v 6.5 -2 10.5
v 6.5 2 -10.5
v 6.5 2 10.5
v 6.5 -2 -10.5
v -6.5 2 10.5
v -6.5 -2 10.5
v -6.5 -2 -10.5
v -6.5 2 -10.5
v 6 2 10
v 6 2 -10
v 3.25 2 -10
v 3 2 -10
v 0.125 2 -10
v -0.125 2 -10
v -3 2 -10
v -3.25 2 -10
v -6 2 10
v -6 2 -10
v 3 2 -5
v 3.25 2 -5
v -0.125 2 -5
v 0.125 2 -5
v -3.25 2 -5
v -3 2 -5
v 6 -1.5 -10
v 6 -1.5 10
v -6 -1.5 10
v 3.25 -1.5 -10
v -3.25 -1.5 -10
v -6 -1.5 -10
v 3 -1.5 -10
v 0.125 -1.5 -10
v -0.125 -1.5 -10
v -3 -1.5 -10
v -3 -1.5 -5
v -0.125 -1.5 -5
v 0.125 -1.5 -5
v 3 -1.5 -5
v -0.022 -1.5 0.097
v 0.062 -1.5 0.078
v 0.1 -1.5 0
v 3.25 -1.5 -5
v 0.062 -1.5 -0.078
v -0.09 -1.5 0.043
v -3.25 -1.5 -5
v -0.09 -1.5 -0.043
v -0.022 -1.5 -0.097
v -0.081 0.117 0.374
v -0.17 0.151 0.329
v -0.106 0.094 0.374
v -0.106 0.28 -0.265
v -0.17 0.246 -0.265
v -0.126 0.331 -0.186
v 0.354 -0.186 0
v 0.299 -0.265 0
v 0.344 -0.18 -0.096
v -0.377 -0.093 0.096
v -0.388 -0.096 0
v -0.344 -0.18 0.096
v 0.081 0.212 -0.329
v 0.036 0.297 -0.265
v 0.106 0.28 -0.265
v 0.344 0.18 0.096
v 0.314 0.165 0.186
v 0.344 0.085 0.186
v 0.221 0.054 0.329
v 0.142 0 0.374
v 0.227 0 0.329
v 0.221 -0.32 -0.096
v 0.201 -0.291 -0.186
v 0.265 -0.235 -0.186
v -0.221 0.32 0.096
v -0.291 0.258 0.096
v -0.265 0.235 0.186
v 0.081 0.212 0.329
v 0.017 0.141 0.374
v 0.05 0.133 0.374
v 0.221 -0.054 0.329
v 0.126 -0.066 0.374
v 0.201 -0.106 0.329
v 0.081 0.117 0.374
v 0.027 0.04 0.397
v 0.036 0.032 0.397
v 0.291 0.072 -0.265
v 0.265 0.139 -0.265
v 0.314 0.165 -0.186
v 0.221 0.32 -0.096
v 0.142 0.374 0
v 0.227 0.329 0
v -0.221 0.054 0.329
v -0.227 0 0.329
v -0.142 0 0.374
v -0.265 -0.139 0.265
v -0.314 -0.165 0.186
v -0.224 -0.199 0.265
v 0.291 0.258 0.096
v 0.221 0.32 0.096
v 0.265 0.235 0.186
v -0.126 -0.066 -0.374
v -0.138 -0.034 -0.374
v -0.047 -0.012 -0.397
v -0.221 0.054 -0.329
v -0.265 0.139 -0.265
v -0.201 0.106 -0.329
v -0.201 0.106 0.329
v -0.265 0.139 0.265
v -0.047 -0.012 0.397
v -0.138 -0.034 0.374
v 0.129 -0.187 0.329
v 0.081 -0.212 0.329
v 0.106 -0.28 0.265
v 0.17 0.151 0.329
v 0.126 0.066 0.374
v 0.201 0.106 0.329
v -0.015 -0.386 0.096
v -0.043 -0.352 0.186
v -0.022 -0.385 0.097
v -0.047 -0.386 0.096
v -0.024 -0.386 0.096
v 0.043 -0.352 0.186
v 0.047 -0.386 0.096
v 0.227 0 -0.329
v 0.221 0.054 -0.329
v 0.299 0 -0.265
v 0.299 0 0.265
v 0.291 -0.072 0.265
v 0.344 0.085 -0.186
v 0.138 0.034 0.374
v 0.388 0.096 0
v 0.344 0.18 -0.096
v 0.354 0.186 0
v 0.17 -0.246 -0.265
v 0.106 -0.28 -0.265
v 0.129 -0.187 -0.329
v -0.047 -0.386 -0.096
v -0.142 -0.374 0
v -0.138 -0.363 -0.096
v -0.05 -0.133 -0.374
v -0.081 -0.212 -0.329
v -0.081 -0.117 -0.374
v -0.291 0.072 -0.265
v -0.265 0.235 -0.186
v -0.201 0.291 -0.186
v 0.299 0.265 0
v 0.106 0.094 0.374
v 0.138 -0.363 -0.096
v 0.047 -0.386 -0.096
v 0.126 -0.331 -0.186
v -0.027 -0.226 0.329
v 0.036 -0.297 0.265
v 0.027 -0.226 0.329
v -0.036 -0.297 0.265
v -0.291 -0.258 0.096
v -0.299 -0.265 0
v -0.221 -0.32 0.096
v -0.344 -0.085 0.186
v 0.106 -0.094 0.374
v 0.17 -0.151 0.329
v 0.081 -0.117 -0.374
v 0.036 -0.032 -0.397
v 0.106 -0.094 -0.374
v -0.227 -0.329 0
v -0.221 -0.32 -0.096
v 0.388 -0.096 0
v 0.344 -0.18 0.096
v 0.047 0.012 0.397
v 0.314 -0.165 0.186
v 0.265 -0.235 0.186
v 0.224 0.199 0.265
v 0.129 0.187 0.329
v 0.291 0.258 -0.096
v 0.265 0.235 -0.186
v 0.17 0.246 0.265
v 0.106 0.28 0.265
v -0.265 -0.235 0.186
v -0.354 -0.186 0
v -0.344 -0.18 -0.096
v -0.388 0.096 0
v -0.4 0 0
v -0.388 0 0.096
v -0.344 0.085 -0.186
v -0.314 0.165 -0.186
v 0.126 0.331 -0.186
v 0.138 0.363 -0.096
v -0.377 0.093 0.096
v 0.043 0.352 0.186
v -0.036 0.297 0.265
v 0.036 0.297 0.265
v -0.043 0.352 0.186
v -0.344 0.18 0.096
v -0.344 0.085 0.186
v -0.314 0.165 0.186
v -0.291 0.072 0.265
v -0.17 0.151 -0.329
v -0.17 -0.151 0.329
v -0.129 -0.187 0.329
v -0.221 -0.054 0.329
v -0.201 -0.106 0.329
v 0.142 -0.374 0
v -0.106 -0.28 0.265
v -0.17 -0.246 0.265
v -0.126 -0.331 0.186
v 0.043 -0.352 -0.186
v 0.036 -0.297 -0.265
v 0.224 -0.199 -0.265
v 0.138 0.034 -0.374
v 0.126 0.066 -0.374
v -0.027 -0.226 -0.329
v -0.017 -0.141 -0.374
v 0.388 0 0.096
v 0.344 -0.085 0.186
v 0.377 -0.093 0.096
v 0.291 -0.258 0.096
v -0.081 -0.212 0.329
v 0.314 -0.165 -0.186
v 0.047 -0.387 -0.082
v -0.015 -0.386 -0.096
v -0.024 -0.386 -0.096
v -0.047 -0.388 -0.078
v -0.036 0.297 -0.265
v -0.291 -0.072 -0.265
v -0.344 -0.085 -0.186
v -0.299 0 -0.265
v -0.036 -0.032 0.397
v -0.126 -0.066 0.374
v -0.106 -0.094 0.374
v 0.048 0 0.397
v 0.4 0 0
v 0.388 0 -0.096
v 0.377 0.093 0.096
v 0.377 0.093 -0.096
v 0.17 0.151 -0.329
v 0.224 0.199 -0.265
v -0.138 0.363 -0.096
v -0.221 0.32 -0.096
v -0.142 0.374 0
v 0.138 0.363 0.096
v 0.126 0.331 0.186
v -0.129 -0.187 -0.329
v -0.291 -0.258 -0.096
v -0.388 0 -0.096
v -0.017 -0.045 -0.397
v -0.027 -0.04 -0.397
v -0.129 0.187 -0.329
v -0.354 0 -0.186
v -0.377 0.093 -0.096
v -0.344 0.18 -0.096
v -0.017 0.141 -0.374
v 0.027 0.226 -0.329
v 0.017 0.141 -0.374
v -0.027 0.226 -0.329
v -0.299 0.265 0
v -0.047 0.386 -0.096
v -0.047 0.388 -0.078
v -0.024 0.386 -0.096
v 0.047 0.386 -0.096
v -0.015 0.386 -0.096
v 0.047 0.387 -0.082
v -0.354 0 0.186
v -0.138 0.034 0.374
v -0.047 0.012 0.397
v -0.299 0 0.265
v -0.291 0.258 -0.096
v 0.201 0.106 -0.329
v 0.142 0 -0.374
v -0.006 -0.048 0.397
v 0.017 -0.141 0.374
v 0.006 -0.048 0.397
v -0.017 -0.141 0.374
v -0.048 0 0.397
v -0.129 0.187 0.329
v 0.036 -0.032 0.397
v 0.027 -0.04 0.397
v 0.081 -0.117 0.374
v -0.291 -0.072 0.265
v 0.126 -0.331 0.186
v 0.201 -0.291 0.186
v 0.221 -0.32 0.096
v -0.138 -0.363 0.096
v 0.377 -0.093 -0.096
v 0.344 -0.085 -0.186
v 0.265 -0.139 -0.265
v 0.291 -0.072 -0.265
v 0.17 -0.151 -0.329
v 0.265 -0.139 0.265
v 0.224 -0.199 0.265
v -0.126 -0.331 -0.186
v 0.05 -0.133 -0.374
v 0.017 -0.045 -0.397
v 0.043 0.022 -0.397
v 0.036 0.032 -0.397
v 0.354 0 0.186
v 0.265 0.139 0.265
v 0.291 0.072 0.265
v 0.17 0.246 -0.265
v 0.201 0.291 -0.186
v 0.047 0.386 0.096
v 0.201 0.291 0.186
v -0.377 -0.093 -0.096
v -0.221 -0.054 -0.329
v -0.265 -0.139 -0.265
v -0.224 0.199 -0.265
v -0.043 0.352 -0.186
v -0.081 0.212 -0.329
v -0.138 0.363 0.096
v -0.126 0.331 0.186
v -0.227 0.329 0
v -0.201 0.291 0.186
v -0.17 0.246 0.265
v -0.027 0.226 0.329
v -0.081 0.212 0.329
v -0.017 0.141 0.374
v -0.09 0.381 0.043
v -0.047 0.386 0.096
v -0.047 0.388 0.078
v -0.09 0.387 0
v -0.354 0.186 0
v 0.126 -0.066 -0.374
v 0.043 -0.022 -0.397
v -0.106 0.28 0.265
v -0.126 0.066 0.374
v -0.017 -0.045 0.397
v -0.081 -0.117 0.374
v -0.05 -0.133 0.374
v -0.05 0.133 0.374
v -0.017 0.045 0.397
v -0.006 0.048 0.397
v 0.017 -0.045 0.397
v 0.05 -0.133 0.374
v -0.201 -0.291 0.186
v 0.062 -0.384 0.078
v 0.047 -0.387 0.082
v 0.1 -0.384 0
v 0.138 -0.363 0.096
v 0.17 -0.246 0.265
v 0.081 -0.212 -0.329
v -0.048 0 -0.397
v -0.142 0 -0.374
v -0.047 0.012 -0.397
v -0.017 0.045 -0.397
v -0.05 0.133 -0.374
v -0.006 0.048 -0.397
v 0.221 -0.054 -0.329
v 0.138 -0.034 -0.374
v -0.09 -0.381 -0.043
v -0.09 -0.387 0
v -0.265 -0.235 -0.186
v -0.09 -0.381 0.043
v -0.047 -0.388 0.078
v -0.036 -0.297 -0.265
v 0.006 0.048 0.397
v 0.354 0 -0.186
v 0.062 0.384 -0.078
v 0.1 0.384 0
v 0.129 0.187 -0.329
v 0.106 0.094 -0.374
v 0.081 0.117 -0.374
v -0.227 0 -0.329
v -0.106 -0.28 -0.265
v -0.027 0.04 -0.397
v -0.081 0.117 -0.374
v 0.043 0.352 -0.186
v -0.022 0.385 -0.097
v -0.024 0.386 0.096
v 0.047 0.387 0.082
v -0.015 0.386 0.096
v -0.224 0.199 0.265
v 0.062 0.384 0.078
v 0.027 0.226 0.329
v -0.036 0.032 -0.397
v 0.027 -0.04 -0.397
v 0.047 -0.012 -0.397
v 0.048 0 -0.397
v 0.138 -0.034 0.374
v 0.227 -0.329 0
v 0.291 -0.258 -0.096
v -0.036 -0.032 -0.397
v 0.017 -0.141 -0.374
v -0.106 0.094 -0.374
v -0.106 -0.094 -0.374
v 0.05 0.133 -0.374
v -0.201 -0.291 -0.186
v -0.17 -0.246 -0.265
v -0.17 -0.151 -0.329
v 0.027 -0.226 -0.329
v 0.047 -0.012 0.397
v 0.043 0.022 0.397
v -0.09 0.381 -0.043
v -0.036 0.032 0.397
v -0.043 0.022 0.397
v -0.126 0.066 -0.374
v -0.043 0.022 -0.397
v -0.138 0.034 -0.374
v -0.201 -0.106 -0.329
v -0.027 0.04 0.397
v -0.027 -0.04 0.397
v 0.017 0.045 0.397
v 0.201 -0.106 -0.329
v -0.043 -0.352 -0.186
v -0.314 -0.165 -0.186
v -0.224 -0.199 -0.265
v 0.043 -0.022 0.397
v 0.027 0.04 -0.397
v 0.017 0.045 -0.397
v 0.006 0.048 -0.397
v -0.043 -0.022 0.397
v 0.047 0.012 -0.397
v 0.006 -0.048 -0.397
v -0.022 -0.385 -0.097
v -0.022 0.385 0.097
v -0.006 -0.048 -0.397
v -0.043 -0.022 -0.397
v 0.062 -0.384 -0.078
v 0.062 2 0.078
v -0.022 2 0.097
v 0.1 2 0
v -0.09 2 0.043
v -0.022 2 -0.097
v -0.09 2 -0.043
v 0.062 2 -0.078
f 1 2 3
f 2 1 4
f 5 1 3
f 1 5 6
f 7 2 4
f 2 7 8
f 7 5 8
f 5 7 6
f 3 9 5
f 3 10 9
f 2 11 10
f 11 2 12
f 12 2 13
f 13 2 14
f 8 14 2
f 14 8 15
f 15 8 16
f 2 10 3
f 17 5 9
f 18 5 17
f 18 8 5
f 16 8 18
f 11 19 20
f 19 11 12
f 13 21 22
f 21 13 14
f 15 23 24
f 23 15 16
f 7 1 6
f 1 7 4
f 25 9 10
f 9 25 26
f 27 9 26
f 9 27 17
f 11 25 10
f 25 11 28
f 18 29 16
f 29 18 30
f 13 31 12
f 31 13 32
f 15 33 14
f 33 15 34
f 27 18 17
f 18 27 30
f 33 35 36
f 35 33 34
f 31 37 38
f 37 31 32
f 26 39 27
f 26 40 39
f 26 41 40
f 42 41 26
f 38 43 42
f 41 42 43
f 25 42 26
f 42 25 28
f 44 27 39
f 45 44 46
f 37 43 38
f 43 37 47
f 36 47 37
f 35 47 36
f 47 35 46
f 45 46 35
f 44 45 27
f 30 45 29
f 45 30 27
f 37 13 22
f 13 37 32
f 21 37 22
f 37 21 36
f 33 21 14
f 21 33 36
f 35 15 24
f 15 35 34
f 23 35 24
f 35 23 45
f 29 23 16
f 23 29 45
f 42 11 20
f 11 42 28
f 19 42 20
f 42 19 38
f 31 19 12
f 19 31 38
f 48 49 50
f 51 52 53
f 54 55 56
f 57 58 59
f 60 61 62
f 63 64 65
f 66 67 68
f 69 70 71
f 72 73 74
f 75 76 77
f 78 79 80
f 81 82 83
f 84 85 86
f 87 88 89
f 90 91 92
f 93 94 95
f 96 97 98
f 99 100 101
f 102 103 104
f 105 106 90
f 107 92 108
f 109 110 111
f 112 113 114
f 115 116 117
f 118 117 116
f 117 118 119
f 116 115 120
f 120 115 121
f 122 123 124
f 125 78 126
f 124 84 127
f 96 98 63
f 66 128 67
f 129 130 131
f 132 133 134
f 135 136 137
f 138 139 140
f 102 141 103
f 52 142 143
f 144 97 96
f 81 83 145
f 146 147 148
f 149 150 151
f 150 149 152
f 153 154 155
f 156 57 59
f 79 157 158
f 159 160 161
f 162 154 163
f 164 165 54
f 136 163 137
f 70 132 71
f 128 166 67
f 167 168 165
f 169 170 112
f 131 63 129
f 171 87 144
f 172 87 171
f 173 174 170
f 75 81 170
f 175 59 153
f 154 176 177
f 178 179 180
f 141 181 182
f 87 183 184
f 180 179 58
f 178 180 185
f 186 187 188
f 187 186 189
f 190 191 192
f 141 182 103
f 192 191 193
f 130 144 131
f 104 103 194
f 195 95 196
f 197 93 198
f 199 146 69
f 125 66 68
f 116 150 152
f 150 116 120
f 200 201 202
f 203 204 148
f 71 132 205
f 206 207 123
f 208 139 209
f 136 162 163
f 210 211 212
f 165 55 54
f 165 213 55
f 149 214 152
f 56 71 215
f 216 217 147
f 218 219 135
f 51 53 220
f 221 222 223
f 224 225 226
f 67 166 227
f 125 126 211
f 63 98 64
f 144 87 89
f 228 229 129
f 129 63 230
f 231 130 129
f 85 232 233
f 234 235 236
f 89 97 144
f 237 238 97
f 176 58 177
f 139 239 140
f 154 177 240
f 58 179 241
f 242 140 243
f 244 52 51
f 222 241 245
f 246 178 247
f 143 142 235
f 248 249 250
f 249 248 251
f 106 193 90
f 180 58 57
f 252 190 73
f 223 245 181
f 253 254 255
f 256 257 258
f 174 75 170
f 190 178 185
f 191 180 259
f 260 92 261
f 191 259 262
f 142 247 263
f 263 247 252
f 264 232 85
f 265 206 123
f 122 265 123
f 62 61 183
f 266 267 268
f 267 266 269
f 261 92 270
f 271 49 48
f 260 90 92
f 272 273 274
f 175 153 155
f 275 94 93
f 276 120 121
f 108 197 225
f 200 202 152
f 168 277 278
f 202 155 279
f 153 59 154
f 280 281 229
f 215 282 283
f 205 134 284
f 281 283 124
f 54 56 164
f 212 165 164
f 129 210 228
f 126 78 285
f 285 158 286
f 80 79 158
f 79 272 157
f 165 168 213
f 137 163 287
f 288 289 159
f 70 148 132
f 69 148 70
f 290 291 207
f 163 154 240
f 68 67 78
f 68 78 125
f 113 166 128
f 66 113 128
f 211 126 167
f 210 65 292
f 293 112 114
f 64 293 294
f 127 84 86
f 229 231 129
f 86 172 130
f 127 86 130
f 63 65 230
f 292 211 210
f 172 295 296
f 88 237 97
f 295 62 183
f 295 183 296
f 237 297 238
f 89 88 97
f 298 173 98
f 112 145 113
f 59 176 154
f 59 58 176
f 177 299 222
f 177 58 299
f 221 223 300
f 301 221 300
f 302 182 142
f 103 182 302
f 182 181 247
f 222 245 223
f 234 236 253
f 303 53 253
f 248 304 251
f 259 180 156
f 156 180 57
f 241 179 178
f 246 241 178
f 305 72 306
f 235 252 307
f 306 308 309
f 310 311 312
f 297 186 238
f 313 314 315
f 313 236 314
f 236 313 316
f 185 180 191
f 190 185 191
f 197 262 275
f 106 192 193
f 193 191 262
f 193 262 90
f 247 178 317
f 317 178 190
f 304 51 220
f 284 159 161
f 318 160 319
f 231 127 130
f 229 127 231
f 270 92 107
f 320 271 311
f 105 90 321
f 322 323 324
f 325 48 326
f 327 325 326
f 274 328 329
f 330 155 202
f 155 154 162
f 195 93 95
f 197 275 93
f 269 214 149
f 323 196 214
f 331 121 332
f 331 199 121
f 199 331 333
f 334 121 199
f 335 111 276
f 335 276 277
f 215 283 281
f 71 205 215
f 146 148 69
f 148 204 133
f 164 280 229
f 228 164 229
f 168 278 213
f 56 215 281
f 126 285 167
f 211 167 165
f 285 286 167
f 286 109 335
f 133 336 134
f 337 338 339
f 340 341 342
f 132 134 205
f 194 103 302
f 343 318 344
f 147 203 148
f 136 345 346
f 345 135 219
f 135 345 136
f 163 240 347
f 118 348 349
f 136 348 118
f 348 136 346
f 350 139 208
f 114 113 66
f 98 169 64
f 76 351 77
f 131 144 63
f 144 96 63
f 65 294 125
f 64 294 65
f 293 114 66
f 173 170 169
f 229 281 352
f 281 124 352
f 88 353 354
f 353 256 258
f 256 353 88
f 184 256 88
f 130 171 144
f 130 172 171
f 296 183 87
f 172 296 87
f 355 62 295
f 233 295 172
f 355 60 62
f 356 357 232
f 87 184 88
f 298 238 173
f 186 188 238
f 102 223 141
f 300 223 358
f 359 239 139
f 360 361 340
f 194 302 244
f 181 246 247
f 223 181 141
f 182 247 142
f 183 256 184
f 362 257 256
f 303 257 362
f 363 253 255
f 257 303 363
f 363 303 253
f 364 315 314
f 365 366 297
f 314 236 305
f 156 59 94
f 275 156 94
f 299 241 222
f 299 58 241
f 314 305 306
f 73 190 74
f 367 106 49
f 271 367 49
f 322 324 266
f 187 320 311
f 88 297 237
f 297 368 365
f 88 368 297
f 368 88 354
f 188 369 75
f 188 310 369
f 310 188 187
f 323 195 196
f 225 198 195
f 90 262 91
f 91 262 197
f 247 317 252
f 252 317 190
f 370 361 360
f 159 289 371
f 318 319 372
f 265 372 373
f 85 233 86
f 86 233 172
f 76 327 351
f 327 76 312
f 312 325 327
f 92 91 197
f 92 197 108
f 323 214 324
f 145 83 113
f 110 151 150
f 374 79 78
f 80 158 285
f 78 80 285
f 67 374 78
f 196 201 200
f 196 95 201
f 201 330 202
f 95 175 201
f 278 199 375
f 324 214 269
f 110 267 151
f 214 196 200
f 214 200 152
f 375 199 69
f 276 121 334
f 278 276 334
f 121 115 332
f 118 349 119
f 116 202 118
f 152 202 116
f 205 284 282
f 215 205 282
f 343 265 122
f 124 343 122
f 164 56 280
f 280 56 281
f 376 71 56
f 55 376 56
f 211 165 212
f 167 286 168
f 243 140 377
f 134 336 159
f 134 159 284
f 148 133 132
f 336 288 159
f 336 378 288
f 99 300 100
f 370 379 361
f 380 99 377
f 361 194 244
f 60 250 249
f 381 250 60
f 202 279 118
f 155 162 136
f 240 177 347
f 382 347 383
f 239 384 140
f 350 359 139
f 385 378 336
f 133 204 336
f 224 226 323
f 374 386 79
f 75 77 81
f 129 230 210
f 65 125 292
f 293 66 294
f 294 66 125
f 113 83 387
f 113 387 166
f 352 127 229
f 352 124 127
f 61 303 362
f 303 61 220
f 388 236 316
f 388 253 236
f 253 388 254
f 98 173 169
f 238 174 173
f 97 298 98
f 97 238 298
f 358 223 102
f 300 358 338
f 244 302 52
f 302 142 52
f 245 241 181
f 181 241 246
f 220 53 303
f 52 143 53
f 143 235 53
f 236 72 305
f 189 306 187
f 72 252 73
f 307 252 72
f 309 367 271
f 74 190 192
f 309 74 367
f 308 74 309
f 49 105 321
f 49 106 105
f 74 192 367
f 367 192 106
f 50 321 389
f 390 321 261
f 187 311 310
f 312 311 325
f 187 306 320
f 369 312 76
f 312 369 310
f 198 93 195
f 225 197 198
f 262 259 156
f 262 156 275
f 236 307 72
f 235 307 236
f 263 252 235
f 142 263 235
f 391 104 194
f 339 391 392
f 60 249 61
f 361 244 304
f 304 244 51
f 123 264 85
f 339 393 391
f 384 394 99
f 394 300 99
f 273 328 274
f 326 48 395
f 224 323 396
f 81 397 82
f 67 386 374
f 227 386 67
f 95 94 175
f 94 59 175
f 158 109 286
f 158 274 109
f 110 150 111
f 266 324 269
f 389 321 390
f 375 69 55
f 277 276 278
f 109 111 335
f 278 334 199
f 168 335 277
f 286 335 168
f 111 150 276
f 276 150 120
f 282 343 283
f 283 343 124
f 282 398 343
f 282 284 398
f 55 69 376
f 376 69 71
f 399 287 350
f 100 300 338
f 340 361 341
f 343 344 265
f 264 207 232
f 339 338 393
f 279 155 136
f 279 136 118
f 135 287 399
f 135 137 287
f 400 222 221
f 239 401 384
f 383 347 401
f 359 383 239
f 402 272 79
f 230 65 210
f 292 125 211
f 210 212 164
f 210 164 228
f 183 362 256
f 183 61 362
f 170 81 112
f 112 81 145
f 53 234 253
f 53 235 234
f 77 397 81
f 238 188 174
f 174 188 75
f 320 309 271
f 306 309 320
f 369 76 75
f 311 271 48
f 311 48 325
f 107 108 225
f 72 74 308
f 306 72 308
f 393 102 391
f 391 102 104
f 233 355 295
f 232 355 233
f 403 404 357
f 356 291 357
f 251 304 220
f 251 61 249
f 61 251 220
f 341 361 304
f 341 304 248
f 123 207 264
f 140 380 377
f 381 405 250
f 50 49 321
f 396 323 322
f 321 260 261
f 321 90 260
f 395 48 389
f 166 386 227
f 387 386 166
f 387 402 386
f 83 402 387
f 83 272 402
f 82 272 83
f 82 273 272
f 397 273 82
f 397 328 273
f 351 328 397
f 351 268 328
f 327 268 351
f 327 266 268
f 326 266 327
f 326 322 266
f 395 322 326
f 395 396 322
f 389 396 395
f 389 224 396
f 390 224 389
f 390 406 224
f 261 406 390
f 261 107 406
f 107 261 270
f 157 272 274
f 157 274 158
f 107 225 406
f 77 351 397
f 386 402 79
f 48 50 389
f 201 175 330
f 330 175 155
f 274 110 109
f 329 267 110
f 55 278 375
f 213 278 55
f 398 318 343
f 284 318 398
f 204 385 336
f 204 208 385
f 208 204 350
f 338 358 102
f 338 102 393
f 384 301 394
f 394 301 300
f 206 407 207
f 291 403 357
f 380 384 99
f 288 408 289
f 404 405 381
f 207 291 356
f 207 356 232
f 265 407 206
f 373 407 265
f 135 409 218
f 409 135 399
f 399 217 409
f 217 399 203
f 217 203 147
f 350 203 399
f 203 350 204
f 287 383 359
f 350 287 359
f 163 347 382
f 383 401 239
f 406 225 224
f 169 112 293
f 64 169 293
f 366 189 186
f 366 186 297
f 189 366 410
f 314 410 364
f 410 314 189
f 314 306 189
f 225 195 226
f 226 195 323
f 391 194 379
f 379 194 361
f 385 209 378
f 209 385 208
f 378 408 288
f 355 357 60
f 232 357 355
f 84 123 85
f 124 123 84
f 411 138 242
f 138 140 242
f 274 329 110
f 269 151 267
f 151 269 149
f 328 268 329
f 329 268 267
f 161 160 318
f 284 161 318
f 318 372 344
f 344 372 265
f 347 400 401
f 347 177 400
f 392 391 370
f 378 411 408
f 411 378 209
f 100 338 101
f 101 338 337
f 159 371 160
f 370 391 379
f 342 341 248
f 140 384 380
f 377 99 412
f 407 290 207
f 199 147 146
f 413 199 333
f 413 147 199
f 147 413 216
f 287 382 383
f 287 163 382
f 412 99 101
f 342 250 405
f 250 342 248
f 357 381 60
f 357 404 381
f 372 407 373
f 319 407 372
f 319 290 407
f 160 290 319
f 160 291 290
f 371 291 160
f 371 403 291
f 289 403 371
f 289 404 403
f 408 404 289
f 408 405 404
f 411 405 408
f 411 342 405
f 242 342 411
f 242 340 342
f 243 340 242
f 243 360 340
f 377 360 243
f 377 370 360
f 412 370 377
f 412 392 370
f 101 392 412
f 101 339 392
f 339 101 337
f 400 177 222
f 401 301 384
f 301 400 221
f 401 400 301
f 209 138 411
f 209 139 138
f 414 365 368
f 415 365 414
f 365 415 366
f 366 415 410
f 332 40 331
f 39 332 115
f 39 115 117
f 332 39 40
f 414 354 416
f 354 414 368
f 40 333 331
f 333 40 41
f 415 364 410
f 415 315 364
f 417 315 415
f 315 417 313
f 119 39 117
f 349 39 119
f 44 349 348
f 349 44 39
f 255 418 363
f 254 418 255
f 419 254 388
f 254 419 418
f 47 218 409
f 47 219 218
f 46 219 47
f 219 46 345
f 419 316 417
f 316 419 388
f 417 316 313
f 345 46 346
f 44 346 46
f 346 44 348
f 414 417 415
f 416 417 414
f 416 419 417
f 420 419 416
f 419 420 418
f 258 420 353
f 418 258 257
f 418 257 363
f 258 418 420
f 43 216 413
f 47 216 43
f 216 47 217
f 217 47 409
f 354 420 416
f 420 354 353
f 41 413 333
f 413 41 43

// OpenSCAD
$fs=0.1;

height = 20;
depth = 4;
width = 12;

start = -width / 2;

height_small = 5;

thick = 0.5;

sep_thick = 0.25;
sphere_radius = 0.4;
pin_radius = 0.1;

two_pokets = [
[0, 0, (height_small - height) / 2]
];

four_pokets = [
[0, 0, (height_small - height) / 2],
[start + 3 - sep_thick/2, 0, (height_small - height) / 2],
[-start - 3 + sep_thick/2, 0, (height_small - height) / 2],

];

sphere(r = sphere_radius, $fs=0.1);

union(){
	difference () {
		cube([width + 2 * thick, depth, height + 2 * thick], center = true);
		translate([0, thick, 0]) 
			cube([width, depth, height], center = true);
	}
	
	for (a = four_pokets)
		translate(a)
			cube([sep_thick, depth, height_small], center = true);

	
}


rotate(a=90, v=[1,0,0]) { 
	cylinder(h=depth, r=pin_radius, center=true);
}
